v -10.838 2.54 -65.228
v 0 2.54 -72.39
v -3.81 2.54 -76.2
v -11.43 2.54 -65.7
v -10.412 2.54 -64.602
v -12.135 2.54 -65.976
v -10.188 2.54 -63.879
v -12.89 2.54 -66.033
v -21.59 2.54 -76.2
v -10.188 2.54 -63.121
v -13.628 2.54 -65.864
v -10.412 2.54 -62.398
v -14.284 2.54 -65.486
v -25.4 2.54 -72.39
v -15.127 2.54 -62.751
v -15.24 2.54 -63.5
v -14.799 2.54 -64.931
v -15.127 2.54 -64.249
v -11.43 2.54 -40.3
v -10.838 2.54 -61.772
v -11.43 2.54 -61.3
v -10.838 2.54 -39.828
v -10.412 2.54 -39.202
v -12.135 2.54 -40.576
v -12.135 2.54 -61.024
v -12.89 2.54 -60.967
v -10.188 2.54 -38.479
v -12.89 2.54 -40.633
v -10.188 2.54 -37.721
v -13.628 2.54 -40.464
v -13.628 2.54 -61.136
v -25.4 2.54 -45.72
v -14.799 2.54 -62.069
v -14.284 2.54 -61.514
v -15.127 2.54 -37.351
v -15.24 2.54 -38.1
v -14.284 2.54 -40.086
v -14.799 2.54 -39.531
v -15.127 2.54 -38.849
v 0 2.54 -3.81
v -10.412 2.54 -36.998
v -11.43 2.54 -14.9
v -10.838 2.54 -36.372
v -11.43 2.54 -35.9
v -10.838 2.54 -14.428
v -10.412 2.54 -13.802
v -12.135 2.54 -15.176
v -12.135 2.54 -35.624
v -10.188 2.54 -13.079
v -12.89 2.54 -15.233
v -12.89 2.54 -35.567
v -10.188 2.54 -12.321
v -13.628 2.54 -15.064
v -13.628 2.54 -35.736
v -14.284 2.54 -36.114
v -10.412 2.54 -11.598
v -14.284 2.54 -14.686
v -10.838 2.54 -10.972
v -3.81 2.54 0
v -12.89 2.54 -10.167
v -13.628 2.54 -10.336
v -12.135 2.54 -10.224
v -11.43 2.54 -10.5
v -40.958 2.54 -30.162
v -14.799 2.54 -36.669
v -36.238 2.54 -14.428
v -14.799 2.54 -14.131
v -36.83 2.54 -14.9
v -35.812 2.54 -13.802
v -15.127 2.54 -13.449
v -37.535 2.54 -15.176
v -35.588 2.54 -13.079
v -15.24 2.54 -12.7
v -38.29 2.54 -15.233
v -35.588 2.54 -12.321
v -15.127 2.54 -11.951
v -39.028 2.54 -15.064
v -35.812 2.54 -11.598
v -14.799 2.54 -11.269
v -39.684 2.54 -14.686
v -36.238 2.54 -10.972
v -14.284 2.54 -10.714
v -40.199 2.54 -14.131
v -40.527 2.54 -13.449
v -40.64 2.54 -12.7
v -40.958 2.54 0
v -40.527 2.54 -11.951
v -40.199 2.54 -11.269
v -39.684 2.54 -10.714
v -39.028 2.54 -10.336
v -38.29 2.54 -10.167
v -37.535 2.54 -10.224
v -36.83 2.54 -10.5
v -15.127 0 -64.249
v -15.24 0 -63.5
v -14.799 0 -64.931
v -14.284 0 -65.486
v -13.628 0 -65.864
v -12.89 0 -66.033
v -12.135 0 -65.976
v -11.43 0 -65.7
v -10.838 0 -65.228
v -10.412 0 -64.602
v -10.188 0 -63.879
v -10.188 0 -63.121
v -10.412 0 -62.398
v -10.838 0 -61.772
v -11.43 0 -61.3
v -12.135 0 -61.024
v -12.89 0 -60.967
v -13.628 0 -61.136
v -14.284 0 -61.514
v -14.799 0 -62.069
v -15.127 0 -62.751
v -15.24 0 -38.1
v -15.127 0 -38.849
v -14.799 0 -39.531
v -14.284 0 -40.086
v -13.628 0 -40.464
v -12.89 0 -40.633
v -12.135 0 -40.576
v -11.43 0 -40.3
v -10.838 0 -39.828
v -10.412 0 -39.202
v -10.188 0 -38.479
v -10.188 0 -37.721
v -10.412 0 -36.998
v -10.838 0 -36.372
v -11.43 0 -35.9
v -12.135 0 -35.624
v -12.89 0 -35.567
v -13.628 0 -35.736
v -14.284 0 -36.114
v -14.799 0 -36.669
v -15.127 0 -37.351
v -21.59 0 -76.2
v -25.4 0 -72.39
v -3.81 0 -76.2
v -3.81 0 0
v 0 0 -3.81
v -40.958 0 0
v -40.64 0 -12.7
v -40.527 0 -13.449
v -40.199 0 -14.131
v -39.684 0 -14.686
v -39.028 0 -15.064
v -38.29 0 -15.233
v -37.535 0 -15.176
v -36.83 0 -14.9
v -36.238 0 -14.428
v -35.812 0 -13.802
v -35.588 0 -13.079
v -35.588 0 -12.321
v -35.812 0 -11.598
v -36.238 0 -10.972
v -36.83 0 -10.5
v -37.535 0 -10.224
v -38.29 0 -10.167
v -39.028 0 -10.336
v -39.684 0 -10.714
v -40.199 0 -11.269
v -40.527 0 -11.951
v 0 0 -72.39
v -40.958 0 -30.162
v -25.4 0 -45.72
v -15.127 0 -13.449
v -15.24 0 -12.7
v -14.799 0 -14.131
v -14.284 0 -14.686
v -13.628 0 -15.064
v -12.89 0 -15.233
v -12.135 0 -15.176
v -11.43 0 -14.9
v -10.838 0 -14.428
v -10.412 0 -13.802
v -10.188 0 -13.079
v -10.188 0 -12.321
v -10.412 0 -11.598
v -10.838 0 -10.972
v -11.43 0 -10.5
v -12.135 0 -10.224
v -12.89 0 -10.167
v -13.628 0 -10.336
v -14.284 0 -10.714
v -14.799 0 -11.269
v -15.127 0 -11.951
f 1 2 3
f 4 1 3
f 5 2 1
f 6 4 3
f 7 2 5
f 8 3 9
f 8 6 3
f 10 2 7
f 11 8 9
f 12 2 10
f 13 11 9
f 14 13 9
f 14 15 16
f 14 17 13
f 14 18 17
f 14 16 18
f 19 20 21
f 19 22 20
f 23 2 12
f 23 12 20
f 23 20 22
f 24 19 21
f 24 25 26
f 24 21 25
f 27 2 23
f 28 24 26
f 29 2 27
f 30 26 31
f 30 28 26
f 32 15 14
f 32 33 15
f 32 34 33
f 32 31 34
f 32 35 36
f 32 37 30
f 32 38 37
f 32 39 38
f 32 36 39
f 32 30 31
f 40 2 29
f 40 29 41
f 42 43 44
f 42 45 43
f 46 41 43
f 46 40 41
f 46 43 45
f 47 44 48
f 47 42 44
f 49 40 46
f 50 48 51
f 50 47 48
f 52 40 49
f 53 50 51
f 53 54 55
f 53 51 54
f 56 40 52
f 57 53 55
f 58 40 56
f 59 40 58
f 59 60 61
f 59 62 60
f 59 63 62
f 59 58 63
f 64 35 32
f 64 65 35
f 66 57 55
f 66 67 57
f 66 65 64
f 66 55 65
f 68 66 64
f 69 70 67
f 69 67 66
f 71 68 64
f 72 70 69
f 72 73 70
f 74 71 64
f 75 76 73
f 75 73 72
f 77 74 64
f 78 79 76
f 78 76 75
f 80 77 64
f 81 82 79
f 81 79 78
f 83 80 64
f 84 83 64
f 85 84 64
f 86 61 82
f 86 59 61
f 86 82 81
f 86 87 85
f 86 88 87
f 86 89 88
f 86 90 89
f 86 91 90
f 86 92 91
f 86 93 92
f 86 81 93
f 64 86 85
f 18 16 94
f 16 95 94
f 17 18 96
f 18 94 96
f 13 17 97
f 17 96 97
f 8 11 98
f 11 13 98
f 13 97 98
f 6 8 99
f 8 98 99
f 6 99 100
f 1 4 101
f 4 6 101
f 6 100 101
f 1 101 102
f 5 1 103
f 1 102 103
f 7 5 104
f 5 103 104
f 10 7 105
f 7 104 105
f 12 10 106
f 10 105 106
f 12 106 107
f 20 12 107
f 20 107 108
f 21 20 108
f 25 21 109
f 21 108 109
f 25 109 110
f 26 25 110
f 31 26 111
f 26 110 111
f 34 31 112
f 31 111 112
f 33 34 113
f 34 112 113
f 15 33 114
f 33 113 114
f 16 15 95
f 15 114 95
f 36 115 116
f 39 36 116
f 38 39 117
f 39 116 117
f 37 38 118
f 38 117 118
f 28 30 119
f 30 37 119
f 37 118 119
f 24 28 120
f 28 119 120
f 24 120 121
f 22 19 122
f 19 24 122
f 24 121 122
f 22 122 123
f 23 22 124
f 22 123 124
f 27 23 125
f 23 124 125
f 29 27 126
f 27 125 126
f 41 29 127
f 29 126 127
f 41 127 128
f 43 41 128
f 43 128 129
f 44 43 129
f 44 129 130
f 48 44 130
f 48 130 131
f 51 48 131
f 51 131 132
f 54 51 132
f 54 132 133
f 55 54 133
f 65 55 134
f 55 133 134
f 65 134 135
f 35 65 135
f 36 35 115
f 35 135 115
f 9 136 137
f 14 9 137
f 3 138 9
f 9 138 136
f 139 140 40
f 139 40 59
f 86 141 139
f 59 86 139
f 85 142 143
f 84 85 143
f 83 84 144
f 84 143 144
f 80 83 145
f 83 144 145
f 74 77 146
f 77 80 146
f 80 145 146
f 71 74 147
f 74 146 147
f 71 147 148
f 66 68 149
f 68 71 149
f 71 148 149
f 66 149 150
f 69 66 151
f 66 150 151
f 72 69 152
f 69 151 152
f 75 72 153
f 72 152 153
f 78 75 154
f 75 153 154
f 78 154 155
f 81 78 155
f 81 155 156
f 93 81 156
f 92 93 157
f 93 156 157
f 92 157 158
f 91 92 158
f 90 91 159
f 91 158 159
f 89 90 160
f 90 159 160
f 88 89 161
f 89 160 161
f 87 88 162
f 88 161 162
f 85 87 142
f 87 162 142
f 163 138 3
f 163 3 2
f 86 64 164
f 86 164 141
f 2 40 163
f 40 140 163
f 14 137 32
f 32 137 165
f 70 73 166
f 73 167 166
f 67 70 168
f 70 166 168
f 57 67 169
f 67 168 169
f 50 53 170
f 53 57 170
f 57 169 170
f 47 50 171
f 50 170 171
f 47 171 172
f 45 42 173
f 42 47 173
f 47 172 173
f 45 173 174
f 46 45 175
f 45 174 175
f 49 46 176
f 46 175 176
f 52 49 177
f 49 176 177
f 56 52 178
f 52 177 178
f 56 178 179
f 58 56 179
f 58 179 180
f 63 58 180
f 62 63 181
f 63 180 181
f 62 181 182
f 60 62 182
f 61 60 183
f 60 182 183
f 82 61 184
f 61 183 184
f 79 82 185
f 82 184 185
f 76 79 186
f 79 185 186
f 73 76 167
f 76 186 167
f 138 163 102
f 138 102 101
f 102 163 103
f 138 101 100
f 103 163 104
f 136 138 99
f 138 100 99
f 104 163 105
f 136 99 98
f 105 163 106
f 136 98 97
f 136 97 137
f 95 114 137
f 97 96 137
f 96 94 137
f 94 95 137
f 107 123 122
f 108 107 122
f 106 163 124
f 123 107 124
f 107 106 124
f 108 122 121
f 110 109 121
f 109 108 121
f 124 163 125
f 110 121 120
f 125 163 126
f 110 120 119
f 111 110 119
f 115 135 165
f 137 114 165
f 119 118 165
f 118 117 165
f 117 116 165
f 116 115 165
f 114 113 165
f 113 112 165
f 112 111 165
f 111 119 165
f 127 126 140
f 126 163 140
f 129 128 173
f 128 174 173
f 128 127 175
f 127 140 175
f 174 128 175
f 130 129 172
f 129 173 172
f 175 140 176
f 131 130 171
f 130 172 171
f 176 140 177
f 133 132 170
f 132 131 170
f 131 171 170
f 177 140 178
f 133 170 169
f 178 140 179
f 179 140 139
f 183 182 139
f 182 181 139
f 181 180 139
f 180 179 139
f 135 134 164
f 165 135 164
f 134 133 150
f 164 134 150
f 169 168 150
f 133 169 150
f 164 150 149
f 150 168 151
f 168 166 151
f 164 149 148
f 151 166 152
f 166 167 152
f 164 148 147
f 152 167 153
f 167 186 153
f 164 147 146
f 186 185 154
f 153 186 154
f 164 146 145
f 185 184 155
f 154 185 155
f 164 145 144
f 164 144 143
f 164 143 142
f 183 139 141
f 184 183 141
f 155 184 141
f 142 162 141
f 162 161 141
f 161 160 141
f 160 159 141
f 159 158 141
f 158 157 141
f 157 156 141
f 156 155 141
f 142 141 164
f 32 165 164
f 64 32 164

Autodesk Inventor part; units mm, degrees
ref_plane "YZ Plane" through (0, 0, 0) normal (1, 0, 0) x (0, 1, 0)
ref_plane "XZ Plane" through (0, 0, 0) normal (0, 1, 0) x (-1, 0, 0)
ref_plane "XY Plane" through (0, 0, 0) normal (0, 0, 1) x (1, 0, 0)
sketch "Sketch1" plane through (0, 0, 0) normal (0, 1, 0) x (-1, 0, 0)
  line L0 (25.4, -45.72) -> (45.72, -25.4)
  line L1 (0, -3.81) -> (3.81, 0)
  line L2 (3.81, -76.2) -> (0, -72.39)
  line L3 (21.59, -76.2) -> (25.4, -72.39)
  line L4 (0, -3.81) -> (0, -72.39)
  line L5 (3.81, -76.2) -> (21.59, -76.2)
  line L6 (25.4, -72.39) -> (25.4, -45.72)
  circle A0 centre (38.1, -12.7) radius 2.54
  circle A1 centre (12.7, -12.7) radius 2.54
  circle A2 centre (12.7, -38.1) radius 2.54
  circle A3 centre (12.7, -63.5) radius 2.54
  line L7 (45.72, -25.4) -> (45.72, 0)
  line L8 (45.72, 0) -> (3.81, 0)
  point P0 (0, 0)
extrude "Extrusion2" add sketch "Sketch1" along normal blind 2.54
sketch "Sketch2" plane through (-45.72, 0, -25.4) normal (-1, 0, 0) x (0, 0, 1)
  line L0 (31.6621, -8.1072) -> (-13.5147, -8.1072)
  line L1 (-13.5147, -8.1072) -> (-13.5147, 15.8231)
  line L2 (-13.5147, 15.8231) -> (31.6621, 15.8231)
  line L3 (31.6621, 15.8231) -> (31.6621, -8.1072)
  point P0 (25.4, 0)
extrude "Extrusion3" cut sketch "Sketch2" against normal blind 4.7625
properties part number "1in corner bracket for extrusions cut" material "Steel, Alloy"
